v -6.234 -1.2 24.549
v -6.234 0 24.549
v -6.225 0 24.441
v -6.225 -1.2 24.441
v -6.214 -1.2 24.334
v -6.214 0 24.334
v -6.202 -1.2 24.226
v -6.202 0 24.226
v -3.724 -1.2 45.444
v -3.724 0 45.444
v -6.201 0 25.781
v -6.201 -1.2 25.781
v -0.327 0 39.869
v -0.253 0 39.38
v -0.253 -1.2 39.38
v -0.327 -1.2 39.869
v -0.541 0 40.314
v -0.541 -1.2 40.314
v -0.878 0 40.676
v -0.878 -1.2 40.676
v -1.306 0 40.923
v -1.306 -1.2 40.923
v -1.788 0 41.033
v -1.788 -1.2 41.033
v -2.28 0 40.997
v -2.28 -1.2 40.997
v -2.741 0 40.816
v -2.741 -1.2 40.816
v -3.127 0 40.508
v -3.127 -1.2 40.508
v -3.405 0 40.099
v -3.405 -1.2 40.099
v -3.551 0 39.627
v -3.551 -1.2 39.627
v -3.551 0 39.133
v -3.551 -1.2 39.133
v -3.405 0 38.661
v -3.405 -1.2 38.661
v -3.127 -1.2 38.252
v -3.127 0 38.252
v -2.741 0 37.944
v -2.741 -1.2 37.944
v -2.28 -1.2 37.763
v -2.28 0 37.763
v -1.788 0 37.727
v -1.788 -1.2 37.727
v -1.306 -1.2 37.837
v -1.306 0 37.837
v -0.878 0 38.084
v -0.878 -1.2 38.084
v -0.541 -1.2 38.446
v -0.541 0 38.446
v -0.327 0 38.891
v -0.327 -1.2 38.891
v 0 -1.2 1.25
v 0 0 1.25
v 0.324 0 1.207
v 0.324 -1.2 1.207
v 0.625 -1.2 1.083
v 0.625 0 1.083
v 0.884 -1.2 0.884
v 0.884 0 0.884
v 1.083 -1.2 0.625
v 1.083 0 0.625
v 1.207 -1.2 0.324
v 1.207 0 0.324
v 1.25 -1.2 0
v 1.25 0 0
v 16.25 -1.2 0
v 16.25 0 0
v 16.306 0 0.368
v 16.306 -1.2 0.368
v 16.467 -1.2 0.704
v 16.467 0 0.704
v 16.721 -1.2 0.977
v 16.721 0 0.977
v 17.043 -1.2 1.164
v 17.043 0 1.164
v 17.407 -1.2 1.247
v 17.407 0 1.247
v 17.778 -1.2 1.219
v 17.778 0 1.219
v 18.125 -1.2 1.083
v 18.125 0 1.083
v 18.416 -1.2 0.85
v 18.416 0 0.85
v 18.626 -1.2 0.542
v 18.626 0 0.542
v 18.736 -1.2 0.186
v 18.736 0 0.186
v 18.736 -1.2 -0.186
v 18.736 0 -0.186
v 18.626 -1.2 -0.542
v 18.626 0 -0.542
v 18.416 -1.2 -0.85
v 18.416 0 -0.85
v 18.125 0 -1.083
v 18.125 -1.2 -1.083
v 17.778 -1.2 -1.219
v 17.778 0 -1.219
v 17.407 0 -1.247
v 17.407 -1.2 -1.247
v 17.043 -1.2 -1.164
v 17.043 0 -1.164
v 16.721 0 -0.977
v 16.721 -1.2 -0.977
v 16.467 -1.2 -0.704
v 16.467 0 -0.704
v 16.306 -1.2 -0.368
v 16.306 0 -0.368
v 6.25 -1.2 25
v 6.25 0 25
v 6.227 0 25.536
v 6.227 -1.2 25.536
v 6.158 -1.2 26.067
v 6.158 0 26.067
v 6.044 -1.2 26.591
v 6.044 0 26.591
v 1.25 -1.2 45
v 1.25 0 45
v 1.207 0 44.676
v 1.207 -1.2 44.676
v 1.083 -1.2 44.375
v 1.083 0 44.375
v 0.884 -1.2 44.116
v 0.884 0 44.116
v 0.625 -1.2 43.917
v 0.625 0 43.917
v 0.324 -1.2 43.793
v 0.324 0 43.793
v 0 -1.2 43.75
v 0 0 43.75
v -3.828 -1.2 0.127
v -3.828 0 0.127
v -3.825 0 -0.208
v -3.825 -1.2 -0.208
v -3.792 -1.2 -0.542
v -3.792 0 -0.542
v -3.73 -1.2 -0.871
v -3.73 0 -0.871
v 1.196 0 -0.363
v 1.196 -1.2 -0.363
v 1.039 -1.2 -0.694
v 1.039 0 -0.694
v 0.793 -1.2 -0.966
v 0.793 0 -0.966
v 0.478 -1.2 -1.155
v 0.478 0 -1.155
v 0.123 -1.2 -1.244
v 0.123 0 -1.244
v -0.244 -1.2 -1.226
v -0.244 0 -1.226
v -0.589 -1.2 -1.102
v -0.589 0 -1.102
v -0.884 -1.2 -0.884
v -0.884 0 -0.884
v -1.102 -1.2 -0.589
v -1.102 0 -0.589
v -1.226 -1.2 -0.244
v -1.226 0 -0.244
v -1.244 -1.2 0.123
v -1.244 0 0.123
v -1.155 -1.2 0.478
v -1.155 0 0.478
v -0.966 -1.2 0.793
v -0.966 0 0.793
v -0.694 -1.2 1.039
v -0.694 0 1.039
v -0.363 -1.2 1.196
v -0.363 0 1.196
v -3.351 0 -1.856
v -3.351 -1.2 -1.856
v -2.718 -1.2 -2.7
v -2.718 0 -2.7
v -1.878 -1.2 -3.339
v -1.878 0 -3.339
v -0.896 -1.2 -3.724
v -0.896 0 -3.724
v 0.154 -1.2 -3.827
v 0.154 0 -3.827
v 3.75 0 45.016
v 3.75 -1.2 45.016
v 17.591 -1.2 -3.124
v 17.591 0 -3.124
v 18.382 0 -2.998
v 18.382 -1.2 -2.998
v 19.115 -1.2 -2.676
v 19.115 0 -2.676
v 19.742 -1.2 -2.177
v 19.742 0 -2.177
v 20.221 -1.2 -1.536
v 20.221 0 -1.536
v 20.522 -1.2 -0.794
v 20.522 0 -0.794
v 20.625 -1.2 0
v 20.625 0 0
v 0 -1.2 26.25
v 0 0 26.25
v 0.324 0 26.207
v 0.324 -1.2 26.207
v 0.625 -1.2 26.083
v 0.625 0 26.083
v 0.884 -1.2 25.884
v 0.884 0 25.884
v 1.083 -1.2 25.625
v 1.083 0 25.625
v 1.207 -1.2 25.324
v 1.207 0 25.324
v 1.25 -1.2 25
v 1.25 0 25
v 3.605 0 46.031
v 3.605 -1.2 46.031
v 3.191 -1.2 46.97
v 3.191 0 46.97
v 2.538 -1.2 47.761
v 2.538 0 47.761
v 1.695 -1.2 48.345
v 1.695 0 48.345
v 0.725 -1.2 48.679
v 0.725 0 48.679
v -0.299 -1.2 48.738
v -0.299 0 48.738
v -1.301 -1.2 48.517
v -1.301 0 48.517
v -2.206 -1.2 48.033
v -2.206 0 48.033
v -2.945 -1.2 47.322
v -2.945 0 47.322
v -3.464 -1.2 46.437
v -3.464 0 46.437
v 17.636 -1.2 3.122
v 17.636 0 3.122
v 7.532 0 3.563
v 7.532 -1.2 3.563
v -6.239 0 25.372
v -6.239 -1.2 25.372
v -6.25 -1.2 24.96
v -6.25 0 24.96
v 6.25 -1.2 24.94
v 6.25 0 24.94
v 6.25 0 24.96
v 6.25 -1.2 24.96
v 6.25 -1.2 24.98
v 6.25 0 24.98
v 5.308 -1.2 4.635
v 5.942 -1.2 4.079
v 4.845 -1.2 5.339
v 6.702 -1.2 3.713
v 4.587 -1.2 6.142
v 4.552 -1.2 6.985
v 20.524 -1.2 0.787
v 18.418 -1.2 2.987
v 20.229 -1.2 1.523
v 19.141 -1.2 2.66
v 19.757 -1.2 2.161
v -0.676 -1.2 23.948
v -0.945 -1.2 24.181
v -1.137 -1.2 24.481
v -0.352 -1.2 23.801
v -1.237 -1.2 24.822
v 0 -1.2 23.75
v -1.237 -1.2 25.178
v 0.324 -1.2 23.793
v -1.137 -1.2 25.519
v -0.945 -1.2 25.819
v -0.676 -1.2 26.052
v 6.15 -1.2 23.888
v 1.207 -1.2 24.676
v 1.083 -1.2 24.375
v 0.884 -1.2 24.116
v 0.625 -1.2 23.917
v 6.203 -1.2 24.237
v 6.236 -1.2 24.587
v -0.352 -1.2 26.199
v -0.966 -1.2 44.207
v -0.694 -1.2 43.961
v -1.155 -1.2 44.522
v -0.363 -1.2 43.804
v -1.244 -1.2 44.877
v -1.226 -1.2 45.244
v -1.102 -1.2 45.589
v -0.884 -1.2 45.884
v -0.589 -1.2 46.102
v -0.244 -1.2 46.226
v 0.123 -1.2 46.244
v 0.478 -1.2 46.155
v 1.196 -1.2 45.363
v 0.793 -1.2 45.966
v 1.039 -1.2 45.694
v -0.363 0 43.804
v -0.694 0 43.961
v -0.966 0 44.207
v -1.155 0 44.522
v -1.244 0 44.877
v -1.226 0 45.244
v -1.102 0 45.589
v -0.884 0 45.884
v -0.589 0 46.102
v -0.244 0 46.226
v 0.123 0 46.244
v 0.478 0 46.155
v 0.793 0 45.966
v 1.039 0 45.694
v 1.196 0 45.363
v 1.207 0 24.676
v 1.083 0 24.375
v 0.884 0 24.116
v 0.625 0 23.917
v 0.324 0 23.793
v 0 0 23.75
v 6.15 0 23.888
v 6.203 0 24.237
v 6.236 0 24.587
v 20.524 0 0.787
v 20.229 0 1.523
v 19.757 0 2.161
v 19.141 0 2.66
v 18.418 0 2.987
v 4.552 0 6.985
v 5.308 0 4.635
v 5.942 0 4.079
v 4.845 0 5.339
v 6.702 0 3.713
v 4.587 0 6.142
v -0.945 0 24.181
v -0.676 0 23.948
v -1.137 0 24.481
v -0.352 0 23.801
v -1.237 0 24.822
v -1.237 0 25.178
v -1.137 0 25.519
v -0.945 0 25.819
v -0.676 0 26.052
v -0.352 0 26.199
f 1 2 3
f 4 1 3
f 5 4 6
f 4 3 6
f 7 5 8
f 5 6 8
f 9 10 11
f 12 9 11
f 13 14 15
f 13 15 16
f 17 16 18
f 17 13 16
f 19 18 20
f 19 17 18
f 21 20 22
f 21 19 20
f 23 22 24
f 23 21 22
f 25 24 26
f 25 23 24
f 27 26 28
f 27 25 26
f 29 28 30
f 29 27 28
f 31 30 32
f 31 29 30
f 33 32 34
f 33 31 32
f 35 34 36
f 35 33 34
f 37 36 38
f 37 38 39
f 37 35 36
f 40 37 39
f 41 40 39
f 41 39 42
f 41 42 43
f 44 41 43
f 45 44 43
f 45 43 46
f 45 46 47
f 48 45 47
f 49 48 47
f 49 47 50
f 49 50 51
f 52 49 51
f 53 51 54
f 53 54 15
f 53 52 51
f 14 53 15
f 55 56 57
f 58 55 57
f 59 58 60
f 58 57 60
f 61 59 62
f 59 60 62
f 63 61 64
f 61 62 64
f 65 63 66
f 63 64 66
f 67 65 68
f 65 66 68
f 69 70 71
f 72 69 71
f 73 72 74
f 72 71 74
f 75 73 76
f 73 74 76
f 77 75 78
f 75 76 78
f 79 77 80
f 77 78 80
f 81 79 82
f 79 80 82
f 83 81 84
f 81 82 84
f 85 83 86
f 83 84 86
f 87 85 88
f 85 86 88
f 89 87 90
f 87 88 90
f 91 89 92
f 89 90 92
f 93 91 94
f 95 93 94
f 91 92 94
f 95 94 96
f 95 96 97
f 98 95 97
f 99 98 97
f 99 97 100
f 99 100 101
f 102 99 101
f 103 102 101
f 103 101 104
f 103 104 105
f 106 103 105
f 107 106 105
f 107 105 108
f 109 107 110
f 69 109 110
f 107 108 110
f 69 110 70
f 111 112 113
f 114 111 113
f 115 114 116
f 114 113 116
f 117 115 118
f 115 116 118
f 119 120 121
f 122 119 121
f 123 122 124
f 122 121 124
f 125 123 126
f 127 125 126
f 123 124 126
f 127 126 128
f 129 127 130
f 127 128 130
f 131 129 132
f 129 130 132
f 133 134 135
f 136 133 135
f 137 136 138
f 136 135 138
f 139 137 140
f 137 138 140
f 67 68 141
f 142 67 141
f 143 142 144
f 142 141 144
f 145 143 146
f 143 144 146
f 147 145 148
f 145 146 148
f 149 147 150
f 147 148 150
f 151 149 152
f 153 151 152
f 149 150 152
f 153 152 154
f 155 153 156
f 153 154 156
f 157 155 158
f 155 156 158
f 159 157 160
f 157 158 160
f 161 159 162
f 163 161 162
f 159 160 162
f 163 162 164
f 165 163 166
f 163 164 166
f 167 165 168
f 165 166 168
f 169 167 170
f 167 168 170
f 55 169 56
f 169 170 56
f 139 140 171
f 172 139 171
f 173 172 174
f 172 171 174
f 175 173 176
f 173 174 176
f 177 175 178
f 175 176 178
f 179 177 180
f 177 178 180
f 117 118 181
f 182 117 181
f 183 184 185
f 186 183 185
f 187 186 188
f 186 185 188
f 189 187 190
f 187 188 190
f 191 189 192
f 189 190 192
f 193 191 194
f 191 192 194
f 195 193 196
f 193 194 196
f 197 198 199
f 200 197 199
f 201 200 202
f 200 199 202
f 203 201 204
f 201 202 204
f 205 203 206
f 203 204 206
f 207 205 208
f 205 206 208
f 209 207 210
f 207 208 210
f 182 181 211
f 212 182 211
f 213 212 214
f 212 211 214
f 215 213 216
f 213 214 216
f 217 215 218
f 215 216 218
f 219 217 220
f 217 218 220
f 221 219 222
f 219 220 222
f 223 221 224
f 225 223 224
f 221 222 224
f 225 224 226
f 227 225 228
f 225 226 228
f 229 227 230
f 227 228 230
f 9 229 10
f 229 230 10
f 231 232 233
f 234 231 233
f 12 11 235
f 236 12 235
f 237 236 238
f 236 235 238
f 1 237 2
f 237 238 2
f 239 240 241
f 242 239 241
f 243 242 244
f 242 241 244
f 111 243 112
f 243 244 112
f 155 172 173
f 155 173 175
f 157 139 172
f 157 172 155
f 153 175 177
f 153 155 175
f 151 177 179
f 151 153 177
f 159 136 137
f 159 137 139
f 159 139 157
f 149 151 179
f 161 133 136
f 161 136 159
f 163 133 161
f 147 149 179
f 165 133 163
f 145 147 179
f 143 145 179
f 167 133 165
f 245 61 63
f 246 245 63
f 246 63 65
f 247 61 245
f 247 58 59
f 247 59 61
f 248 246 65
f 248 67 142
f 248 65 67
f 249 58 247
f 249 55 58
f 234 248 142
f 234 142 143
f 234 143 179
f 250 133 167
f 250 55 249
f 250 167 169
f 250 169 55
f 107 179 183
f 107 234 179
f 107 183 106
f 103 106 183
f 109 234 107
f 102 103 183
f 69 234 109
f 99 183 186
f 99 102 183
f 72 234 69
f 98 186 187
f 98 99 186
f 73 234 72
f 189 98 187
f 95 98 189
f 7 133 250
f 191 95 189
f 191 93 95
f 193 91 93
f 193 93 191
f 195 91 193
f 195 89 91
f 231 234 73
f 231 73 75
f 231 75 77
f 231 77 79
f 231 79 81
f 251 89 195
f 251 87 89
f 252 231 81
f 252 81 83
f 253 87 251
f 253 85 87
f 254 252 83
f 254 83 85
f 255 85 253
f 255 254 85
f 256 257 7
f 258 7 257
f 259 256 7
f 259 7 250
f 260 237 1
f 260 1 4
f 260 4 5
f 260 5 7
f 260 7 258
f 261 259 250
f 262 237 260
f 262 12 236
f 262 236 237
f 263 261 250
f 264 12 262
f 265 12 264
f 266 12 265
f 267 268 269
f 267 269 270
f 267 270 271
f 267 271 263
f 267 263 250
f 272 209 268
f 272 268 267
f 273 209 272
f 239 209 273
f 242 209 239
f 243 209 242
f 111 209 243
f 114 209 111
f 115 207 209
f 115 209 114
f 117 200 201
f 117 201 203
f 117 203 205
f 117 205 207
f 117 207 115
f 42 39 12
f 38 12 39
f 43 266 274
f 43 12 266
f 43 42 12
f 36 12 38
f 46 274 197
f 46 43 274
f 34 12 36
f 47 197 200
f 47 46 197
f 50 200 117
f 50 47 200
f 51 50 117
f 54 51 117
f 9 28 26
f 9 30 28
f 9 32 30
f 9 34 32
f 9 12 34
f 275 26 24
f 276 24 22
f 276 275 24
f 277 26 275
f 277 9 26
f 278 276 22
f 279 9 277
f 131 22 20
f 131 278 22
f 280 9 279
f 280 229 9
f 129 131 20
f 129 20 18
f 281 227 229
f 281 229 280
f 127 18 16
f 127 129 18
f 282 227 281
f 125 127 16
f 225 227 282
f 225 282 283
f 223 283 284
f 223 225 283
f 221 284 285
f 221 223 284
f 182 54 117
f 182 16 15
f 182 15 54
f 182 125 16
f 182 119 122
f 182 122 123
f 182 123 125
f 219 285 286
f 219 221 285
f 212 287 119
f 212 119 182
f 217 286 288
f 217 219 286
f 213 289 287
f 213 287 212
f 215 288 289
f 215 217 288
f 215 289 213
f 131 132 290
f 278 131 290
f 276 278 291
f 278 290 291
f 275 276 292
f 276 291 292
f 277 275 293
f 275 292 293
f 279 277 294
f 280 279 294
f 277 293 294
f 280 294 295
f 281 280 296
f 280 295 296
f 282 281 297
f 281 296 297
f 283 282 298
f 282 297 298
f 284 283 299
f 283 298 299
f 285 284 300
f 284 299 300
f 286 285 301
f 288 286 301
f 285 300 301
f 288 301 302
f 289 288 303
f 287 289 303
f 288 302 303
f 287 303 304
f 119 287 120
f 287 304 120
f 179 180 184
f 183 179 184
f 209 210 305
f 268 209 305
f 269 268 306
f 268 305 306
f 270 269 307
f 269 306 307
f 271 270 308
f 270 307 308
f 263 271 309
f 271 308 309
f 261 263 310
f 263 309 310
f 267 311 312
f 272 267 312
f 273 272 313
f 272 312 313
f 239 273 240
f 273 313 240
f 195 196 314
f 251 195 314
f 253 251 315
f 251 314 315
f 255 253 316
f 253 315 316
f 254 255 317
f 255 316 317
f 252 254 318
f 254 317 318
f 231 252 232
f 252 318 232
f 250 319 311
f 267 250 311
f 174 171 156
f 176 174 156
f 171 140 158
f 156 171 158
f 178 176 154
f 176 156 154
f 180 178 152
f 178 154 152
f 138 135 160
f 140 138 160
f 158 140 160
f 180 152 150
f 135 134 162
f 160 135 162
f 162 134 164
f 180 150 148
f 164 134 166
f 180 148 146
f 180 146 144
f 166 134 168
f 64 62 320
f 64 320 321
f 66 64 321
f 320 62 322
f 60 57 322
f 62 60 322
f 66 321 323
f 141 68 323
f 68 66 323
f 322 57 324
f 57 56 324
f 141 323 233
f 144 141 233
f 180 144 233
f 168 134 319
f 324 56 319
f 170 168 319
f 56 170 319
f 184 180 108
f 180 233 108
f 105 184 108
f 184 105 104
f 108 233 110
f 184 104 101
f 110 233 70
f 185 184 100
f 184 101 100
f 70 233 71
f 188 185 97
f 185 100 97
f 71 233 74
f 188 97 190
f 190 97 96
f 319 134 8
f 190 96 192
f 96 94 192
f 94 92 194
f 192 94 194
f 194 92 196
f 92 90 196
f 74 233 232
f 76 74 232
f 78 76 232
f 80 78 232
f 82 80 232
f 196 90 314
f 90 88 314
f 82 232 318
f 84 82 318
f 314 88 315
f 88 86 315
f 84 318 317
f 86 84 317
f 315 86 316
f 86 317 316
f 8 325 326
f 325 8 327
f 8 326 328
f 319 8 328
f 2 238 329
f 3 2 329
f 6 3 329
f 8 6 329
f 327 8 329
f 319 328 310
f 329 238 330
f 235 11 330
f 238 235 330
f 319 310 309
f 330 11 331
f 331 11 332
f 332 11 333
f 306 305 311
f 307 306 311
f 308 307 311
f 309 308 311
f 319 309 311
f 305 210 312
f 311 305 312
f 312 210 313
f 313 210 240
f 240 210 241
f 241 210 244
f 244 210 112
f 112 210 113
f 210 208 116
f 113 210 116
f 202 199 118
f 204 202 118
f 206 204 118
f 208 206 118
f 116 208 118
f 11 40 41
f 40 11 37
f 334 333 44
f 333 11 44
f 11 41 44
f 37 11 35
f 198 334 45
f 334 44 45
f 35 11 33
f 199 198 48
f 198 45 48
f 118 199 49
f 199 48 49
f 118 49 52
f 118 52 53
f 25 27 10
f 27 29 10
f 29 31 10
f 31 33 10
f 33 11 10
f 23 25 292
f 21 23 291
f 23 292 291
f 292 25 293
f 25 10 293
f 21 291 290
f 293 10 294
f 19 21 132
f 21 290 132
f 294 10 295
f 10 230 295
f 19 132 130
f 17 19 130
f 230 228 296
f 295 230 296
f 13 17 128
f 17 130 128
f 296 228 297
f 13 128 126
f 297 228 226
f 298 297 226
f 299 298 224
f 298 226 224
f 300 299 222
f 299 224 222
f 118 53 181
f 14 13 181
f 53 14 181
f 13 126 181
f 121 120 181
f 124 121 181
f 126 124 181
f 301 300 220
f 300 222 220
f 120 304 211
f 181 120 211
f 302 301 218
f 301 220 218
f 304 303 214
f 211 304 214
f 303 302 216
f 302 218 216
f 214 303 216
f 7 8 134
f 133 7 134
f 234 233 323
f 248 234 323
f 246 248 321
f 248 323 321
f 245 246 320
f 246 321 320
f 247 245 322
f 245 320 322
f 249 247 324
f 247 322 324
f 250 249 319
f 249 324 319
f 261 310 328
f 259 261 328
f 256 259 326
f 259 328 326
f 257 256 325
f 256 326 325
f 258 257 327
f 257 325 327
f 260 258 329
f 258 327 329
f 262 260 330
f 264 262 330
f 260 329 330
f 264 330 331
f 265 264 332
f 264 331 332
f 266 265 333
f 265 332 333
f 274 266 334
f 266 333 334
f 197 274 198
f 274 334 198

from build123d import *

# Parameters (mm, degrees)
F0_R     = 1.6581186228
F1_DEPTH = 1.2


with BuildPart() as f1:
    # F0 (on Front) → F1 (new body)
    with BuildSketch(Plane.XZ):
        with BuildLine():
            ThreePointArc((1.25, 0), (-0.8838834765, -0.8838834765), (0, 1.25))
            Line((0, 1.25), (0, 3.8304899347))
            ThreePointArc((0, 3.8304899347), (-2.6634496965, 2.7529418545), (-3.8283991196, 0.126543752))
            Line((-3.8283991196, 0.126543752), (-3.7301566118, -0.8709677329))
            ThreePointArc((-3.7301566118, -0.8709677329), (-2.3198010798, -3.048143056), (0.1544652488, -3.8273742471))
            ThreePointArc((0.1544652488, -3.8273742471), (2.7626373921, -2.6533917501), (3.8304899347, 0))
            Line((3.8304899347, 0), (1.25, 0))
        make_face()
        with BuildLine():
            Line((0, 3.8304899347), (0, 1.25))
            ThreePointArc((0, 1.25), (0.8838834765, 0.8838834765), (1.25, 0))
            Line((1.25, 0), (3.8304899347, 0))
            ThreePointArc((3.8304899347, 0), (2.7085654081, 2.7085654081), (0, 3.8304899347))
        make_face()
        with BuildLine():
            ThreePointArc((-3.8283991196, 0.126543752), (-2.6634496965, 2.7529418545), (0, 3.8304899347))
            Line((0, 3.8304899347), (0, 18.75))
            ThreePointArc((0, 18.75), (-4.1368389571, 20.315017242), (-6.2019261398, 24.2262996982))
            Line((-6.2019261398, 24.2262996982), (-3.8283991196, 0.126543752))
        make_face()
        with BuildLine():
            Line((0, 18.75), (0, 3.8304899347))
            ThreePointArc((0, 3.8304899347), (2.7085654081, 2.7085654081), (3.8304899347, 0))
            Line((3.8304899347, 0), (14.375, 0))
            ThreePointArc((14.375, 0), (15.3390218203, 2.257387496), (17.6363109165, 3.122025678))
            Line((17.6363109165, 3.122025678), (7.5319273502, 3.5631936653))
            ThreePointArc((7.5319273502, 3.5631936653), (5.3080013875, 4.6346970575), (4.5523493544, 6.9847941218))
            Line((4.5523493544, 6.9847941218), (6.150289486, 23.8880471063))
            ThreePointArc((6.150289486, 23.8880471063), (4.0070434496, 20.2035322587), (0, 18.75))
        make_face()
        with BuildLine():
            Line((14.375, 0), (3.8304899347, 0))
            ThreePointArc((3.8304899347, 0), (2.7626373921, -2.6533917501), (0.1544652488, -3.8273742471))
            Line((0.1544652488, -3.8273742471), (17.5906089776, -3.1236861259))
            ThreePointArc((17.5906089776, -3.1236861259), (15.3225620623, -2.2415148957), (14.375, 0))
        make_face()
        with BuildLine():
            ThreePointArc((-6.2019261398, 24.2262996982), (-4.1368389571, 20.315017242), (0, 18.75))
            Line((0, 18.75), (0, 23.75))
            ThreePointArc((0, 23.75), (-1.25, 25), (0, 26.25))
            Line((0, 26.25), (0, 31.25))
            ThreePointArc((0, 31.25), (-4.1339767257, 29.6875085527), (-6.2009764026, 25.7812756582))
            ThreePointArc((-6.2009764026, 25.7812756582), (-6.2477972764, 25.1659192352), (-6.2337027111, 24.5489451152))
            Line((-6.2337027111, 24.5489451152), (-6.2019261398, 24.2262996982))
        make_face()
        with BuildLine():
            Line((0, 23.75), (0, 18.75))
            ThreePointArc((0, 18.75), (4.0070434496, 20.2035322587), (6.150289486, 23.8880471063))
            Line((6.150289486, 23.8880471063), (6.2497093523, 24.9397255246))
            Line((6.2497093523, 24.9397255246), (6.0440984205, 26.5910293157))
            ThreePointArc((6.0440984205, 26.5910293157), (3.8156629029, 29.9500723845), (0, 31.25))
            Line((0, 31.25), (0, 26.25))
            ThreePointArc((0, 26.25), (0.8838834765, 25.8838834765), (1.25, 25))
            ThreePointArc((1.25, 25), (0.8838834765, 24.1161165235), (0, 23.75))
        make_face()
        with BuildLine():
            Line((-3.7301566118, -0.8709677329), (-3.8283991196, 0.126543752))
            ThreePointArc((-3.8283991196, 0.126543752), (-3.8120464946, -0.375439294), (-3.7301566118, -0.8709677329))
        make_face()
        with BuildLine():
            ThreePointArc((17.6363109165, 3.122025678), (15.3390218203, 2.257387496), (14.375, 0))
            ThreePointArc((14.375, 0), (15.3225620623, -2.2415148957), (17.5906089776, -3.1236861259))
            ThreePointArc((17.5906089776, -3.1236861259), (19.7415148957, -2.1774379377), (20.625, 0))
            ThreePointArc((20.625, 0), (19.757387496, 2.1609781797), (17.6363109165, 3.122025678))
        make_face()
        with BuildLine():
            ThreePointArc((18.75, 0), (17.5, -1.25), (16.25, 0))
            ThreePointArc((16.25, 0), (17.5, 1.25), (18.75, 0))
        make_face(mode=Mode.SUBTRACT)
        with BuildLine():
            ThreePointArc((-6.2337027111, 24.5489451152), (-6.2199068518, 24.3874163287), (-6.2019261398, 24.2262996982))
            Line((-6.2019261398, 24.2262996982), (-6.2337027111, 24.5489451152))
        make_face()
        with BuildLine():
            Line((6.2497093523, 24.9397255246), (6.150289486, 23.8880471063))
            ThreePointArc((6.150289486, 23.8880471063), (6.222258406, 24.4117820738), (6.2497093523, 24.9397255246))
        make_face()
        with BuildLine():
            Line((6.0440984205, 26.5910293157), (6.2497093523, 24.9397255246))
            ThreePointArc((6.2497093523, 24.9397255246), (6.2499273376, 24.9698624119), (6.25, 25))
            ThreePointArc((6.25, 25), (6.1983108638, 25.8021486371), (6.0440984205, 26.5910293157))
        make_face()
        with BuildLine():
            ThreePointArc((-6.2009764026, 25.7812756582), (-4.1339767257, 29.6875085527), (0, 31.25))
            Line((0, 31.25), (0, 39.38))
            Line((0, 39.38), (0, 41.25))
            ThreePointArc((0, 41.25), (-2.8042828873, 42.5103218104), (-3.7236063691, 45.4441346731))
            Line((-3.7236063691, 45.4441346731), (-6.2009764026, 25.7812756582))
        make_face()
        with Locations((-1.9114875467, 39.38)):
            Circle(F0_R, mode=Mode.SUBTRACT)
        with BuildLine():
            Line((0, 39.38), (0, 31.25))
            ThreePointArc((0, 31.25), (3.8156629029, 29.9500723845), (6.0440984205, 26.5910293157))
            Line((6.0440984205, 26.5910293157), (3.7499672612, 45.015669719))
            ThreePointArc((3.7499672612, 45.015669719), (3.7499918153, 45.0078348766), (3.75, 45))
            ThreePointArc((3.75, 45), (2.6516504294, 42.3483495706), (0, 41.25))
            Line((0, 41.25), (0, 39.38))
        make_face()
        with BuildLine():
            ThreePointArc((3.7499672612, 45.015669719), (0.2146375512, 48.7438523905), (-3.7236063691, 45.4441346731))
            ThreePointArc((-3.7236063691, 45.4441346731), (-2.8042828873, 42.5103218104), (0, 41.25))
            ThreePointArc((0, 41.25), (2.6516504294, 42.3483495706), (3.75, 45))
            ThreePointArc((3.75, 45), (3.7499918153, 45.0078348766), (3.7499672612, 45.015669719))
        make_face()
        with BuildLine():
            ThreePointArc((1.25, 45), (0.8838834765, 44.1161165235), (0, 43.75))
            ThreePointArc((0, 43.75), (-0.8838834765, 45.8838834765), (1.25, 45))
        make_face(mode=Mode.SUBTRACT)
    extrude(amount=F1_DEPTH)


solid = f1.part
